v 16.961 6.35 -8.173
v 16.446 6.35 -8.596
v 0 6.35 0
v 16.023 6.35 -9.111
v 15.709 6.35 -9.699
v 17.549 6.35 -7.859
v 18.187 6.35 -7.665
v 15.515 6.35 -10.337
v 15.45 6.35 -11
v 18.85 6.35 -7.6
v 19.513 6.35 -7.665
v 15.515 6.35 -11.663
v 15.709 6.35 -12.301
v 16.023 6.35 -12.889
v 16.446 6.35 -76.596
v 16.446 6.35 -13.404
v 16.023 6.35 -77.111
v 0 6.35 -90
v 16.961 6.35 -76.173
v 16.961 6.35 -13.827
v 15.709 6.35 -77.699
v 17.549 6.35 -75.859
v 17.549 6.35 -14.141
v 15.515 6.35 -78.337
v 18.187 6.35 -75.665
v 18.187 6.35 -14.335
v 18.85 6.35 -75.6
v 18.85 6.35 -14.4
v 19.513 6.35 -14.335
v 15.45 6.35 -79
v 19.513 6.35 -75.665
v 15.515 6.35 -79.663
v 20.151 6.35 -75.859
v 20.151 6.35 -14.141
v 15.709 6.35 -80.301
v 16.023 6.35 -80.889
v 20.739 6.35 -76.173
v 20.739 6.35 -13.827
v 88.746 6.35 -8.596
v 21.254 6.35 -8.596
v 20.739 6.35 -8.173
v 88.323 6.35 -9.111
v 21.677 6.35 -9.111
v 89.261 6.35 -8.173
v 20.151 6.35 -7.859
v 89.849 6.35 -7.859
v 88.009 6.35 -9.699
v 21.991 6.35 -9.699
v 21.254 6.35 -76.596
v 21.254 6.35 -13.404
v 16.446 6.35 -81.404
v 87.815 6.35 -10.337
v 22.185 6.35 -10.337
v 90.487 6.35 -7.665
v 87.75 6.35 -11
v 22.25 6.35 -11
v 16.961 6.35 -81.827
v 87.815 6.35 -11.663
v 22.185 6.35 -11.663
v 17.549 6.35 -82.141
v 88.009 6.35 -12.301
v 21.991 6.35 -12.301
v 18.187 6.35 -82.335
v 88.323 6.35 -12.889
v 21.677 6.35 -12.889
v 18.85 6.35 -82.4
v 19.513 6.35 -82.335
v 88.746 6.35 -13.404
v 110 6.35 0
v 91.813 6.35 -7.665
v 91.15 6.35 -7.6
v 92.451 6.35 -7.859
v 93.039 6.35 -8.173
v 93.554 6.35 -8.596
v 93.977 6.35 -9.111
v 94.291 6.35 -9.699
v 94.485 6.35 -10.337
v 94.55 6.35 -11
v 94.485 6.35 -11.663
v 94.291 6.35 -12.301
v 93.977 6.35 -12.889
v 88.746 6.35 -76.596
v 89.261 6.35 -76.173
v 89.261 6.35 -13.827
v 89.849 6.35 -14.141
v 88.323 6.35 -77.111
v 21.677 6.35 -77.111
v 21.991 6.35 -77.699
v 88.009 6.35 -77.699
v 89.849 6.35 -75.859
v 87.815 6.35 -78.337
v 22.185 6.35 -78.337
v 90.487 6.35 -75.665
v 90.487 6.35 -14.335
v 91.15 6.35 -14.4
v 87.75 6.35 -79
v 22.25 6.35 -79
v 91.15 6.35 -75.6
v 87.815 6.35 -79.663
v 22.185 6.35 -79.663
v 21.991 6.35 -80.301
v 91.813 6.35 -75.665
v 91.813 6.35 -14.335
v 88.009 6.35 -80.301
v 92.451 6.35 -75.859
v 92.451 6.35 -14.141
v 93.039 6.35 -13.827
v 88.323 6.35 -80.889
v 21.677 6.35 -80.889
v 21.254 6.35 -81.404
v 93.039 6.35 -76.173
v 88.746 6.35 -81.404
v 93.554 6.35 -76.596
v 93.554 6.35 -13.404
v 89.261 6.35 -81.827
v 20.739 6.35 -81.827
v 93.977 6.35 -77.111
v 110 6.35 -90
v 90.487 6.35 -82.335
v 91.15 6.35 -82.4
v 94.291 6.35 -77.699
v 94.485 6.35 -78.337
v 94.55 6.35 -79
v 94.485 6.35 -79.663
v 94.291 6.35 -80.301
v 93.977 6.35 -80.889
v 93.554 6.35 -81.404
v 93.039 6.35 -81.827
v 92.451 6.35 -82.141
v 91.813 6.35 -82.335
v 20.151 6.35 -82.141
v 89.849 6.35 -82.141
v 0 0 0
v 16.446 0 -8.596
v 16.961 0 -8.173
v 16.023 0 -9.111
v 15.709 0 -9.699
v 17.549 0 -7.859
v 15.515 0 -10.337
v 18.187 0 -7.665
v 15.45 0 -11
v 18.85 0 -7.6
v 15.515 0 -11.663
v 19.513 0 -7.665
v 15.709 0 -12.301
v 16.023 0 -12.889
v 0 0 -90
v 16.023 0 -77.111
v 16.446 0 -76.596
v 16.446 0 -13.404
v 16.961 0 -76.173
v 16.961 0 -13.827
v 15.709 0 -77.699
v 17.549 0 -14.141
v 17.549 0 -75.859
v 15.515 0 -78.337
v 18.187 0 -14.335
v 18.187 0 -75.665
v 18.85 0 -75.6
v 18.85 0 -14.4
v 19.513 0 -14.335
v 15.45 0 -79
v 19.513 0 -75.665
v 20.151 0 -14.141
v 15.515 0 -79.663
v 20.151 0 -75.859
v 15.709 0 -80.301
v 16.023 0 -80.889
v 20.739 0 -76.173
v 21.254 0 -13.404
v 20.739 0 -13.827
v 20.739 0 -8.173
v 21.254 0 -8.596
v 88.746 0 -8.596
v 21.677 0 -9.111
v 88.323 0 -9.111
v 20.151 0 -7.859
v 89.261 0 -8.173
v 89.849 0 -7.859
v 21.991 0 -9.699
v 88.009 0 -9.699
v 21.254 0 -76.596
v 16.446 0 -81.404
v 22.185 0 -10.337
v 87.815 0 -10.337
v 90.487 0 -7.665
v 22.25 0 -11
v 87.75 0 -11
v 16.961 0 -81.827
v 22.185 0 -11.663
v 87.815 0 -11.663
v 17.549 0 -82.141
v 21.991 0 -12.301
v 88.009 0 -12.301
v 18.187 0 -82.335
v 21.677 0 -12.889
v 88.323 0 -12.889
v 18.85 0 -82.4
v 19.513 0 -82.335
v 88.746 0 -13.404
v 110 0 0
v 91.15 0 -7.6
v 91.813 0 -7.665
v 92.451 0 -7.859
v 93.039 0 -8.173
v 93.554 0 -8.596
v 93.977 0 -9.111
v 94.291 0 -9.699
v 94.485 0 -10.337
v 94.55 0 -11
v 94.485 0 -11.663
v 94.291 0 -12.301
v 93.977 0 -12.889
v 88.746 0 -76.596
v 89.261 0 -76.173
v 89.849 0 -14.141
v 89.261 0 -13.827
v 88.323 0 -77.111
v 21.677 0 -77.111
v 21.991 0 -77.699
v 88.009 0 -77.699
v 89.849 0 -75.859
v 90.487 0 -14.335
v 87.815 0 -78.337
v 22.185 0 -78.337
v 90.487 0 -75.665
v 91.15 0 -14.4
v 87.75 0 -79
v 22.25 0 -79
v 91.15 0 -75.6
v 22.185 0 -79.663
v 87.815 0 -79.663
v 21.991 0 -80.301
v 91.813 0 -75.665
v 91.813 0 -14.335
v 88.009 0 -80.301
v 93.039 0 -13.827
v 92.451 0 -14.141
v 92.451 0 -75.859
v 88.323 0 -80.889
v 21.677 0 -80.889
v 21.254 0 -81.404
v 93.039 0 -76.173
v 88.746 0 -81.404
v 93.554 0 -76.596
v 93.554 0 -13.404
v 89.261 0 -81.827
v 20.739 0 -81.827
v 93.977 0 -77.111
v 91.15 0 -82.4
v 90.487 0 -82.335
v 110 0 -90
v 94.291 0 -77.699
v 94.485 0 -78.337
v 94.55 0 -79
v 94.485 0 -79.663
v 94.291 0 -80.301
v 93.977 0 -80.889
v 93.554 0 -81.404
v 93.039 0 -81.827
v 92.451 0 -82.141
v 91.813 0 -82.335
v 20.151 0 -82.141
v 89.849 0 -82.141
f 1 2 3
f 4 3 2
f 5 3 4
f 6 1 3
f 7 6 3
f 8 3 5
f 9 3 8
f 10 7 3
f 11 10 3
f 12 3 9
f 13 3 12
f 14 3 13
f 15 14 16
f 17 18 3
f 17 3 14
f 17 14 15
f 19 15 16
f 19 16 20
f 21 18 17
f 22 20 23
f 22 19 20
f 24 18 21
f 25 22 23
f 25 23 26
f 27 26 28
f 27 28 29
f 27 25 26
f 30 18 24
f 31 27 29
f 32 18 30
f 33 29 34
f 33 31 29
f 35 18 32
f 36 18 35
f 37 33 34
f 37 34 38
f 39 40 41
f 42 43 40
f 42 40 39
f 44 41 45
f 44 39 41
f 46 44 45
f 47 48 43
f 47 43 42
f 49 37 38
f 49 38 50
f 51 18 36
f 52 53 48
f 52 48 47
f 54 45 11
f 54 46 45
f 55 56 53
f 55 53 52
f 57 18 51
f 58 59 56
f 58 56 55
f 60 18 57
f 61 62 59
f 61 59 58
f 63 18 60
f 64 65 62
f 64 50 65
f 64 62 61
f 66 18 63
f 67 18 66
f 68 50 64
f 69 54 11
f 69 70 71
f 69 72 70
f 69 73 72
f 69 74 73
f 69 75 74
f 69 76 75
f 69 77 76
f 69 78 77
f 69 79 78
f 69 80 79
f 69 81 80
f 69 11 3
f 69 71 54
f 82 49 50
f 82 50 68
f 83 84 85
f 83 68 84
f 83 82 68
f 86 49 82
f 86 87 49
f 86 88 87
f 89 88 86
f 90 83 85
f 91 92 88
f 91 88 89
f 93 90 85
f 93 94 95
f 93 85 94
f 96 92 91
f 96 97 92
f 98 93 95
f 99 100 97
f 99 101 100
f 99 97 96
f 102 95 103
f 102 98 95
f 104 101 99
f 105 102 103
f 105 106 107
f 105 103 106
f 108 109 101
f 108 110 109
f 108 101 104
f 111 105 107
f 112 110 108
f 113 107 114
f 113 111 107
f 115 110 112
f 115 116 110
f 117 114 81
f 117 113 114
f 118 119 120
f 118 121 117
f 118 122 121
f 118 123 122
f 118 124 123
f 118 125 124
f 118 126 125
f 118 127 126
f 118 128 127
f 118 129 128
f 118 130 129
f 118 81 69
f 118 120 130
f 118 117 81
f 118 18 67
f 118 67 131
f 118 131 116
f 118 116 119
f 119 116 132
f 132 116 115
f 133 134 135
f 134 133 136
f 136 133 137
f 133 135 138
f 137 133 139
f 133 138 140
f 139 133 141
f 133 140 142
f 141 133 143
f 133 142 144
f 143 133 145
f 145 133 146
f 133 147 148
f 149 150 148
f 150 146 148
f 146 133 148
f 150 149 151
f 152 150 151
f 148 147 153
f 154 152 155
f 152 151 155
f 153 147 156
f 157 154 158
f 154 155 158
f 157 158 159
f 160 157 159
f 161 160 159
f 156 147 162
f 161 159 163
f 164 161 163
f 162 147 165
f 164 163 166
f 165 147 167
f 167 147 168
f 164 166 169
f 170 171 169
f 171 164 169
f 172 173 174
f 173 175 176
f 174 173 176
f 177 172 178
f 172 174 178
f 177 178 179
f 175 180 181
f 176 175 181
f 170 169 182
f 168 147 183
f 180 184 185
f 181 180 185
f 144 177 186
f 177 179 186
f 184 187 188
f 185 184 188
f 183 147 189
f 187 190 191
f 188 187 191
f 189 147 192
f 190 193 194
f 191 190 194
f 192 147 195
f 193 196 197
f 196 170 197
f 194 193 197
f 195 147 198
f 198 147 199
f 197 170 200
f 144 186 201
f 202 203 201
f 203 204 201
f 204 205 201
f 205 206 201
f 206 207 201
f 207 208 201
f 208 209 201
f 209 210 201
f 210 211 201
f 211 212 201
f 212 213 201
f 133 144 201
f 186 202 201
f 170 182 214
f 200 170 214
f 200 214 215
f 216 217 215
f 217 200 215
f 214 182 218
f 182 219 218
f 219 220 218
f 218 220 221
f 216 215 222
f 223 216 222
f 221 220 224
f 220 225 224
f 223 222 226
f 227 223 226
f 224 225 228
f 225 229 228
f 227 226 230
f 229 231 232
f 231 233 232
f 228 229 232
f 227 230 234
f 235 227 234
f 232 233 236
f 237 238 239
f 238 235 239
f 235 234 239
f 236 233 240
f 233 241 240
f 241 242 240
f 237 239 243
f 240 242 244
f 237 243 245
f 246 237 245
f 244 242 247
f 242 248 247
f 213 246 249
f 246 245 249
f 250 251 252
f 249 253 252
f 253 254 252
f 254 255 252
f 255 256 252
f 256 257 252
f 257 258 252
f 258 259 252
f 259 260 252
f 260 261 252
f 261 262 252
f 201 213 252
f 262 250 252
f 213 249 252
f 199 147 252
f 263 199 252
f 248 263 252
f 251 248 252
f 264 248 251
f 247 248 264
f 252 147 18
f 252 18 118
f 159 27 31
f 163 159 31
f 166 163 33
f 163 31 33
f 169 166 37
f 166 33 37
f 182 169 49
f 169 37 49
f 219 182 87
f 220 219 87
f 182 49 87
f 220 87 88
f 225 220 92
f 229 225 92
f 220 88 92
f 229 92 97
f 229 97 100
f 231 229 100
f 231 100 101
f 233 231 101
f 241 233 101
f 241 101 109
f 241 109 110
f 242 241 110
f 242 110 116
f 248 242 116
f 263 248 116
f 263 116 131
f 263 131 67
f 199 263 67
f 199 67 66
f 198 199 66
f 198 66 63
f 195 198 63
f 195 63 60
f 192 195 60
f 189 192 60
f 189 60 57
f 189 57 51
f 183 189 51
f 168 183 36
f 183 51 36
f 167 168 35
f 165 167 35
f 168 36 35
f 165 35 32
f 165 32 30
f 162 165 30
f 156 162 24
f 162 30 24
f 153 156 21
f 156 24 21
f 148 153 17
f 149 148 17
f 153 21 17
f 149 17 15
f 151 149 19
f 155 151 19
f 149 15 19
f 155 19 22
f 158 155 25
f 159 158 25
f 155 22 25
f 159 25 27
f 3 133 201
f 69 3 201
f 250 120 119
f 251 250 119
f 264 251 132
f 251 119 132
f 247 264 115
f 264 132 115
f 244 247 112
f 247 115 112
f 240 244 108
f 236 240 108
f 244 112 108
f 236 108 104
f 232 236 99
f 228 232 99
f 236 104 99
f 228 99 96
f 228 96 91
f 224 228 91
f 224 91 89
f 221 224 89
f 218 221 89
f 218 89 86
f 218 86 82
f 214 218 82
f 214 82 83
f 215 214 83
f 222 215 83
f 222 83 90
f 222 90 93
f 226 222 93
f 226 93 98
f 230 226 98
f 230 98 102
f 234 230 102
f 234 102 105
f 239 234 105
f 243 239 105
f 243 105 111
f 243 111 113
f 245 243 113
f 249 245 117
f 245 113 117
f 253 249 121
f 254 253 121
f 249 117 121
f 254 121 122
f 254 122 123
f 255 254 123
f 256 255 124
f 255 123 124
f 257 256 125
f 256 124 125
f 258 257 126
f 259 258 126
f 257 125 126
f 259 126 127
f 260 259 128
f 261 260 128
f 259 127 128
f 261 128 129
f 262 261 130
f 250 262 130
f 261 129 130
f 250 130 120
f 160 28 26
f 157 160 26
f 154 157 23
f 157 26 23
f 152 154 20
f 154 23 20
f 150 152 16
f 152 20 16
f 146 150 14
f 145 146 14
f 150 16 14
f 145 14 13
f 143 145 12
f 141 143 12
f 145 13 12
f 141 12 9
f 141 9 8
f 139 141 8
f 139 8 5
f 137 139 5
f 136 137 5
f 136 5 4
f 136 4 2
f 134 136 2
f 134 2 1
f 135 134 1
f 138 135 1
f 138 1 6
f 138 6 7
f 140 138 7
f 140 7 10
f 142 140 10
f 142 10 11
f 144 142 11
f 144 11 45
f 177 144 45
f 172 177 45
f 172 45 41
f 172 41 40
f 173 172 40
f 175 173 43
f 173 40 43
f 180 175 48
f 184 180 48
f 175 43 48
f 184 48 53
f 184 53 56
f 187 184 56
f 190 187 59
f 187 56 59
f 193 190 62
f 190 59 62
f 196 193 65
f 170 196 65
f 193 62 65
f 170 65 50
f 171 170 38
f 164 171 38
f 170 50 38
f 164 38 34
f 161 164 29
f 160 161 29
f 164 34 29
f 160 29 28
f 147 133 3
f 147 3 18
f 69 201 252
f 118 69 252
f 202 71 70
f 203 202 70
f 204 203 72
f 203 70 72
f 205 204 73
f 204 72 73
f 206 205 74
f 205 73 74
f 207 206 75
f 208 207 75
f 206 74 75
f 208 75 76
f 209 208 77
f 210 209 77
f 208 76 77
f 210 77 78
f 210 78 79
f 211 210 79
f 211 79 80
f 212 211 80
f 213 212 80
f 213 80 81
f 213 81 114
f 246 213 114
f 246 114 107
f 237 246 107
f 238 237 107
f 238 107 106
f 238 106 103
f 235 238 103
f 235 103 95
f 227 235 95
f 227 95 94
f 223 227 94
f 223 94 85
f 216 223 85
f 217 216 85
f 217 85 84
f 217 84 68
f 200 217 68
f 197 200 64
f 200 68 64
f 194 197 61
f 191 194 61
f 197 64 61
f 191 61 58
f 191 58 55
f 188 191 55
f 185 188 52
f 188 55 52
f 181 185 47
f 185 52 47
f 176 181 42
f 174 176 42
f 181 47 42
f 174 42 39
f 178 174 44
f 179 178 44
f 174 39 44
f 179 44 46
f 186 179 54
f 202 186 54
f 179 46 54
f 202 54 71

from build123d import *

# Parameters (mm, degrees)
SKETCH2_W            = 110
SKETCH2_H            = 90
BOSS_EXTRUDE1_DEPTH  = 6.35
SKETCH3_R            = 3.4
MOUNTING_HOLES_DEPTH = 143.268487375


with BuildPart() as part:
    # Sketch2 → Boss-Extrude1 (new body)
    with BuildSketch(Plane(origin=(0, 0, 0), x_dir=(1, 0, 0), z_dir=(0, 1, 0))):
        with Locations((55, 45)):
            Rectangle(SKETCH2_W, SKETCH2_H)
    extrude(amount=BOSS_EXTRUDE1_DEPTH)

    # Sketch3 → Mounting Holes (cut, through all)
    with BuildSketch(Plane(origin=(0, 6.35, 0), x_dir=(1, 0, 0), z_dir=(0, 1, 0))):
        with Locations(Location((18.85, 79, 0), (0, 0, 270))):
            Circle(SKETCH3_R)
        with Locations(Location((18.85, 11, 0), (0, 0, 90))):
            Circle(SKETCH3_R)
        with Locations(Location((91.15, 11, 0), (0, 0, 270))):
            Circle(SKETCH3_R)
        with Locations(Location((91.15, 79, 0), (0, 0, 90))):
            Circle(SKETCH3_R)
    extrude(amount=-MOUNTING_HOLES_DEPTH, mode=Mode.SUBTRACT)


solid = part.part
